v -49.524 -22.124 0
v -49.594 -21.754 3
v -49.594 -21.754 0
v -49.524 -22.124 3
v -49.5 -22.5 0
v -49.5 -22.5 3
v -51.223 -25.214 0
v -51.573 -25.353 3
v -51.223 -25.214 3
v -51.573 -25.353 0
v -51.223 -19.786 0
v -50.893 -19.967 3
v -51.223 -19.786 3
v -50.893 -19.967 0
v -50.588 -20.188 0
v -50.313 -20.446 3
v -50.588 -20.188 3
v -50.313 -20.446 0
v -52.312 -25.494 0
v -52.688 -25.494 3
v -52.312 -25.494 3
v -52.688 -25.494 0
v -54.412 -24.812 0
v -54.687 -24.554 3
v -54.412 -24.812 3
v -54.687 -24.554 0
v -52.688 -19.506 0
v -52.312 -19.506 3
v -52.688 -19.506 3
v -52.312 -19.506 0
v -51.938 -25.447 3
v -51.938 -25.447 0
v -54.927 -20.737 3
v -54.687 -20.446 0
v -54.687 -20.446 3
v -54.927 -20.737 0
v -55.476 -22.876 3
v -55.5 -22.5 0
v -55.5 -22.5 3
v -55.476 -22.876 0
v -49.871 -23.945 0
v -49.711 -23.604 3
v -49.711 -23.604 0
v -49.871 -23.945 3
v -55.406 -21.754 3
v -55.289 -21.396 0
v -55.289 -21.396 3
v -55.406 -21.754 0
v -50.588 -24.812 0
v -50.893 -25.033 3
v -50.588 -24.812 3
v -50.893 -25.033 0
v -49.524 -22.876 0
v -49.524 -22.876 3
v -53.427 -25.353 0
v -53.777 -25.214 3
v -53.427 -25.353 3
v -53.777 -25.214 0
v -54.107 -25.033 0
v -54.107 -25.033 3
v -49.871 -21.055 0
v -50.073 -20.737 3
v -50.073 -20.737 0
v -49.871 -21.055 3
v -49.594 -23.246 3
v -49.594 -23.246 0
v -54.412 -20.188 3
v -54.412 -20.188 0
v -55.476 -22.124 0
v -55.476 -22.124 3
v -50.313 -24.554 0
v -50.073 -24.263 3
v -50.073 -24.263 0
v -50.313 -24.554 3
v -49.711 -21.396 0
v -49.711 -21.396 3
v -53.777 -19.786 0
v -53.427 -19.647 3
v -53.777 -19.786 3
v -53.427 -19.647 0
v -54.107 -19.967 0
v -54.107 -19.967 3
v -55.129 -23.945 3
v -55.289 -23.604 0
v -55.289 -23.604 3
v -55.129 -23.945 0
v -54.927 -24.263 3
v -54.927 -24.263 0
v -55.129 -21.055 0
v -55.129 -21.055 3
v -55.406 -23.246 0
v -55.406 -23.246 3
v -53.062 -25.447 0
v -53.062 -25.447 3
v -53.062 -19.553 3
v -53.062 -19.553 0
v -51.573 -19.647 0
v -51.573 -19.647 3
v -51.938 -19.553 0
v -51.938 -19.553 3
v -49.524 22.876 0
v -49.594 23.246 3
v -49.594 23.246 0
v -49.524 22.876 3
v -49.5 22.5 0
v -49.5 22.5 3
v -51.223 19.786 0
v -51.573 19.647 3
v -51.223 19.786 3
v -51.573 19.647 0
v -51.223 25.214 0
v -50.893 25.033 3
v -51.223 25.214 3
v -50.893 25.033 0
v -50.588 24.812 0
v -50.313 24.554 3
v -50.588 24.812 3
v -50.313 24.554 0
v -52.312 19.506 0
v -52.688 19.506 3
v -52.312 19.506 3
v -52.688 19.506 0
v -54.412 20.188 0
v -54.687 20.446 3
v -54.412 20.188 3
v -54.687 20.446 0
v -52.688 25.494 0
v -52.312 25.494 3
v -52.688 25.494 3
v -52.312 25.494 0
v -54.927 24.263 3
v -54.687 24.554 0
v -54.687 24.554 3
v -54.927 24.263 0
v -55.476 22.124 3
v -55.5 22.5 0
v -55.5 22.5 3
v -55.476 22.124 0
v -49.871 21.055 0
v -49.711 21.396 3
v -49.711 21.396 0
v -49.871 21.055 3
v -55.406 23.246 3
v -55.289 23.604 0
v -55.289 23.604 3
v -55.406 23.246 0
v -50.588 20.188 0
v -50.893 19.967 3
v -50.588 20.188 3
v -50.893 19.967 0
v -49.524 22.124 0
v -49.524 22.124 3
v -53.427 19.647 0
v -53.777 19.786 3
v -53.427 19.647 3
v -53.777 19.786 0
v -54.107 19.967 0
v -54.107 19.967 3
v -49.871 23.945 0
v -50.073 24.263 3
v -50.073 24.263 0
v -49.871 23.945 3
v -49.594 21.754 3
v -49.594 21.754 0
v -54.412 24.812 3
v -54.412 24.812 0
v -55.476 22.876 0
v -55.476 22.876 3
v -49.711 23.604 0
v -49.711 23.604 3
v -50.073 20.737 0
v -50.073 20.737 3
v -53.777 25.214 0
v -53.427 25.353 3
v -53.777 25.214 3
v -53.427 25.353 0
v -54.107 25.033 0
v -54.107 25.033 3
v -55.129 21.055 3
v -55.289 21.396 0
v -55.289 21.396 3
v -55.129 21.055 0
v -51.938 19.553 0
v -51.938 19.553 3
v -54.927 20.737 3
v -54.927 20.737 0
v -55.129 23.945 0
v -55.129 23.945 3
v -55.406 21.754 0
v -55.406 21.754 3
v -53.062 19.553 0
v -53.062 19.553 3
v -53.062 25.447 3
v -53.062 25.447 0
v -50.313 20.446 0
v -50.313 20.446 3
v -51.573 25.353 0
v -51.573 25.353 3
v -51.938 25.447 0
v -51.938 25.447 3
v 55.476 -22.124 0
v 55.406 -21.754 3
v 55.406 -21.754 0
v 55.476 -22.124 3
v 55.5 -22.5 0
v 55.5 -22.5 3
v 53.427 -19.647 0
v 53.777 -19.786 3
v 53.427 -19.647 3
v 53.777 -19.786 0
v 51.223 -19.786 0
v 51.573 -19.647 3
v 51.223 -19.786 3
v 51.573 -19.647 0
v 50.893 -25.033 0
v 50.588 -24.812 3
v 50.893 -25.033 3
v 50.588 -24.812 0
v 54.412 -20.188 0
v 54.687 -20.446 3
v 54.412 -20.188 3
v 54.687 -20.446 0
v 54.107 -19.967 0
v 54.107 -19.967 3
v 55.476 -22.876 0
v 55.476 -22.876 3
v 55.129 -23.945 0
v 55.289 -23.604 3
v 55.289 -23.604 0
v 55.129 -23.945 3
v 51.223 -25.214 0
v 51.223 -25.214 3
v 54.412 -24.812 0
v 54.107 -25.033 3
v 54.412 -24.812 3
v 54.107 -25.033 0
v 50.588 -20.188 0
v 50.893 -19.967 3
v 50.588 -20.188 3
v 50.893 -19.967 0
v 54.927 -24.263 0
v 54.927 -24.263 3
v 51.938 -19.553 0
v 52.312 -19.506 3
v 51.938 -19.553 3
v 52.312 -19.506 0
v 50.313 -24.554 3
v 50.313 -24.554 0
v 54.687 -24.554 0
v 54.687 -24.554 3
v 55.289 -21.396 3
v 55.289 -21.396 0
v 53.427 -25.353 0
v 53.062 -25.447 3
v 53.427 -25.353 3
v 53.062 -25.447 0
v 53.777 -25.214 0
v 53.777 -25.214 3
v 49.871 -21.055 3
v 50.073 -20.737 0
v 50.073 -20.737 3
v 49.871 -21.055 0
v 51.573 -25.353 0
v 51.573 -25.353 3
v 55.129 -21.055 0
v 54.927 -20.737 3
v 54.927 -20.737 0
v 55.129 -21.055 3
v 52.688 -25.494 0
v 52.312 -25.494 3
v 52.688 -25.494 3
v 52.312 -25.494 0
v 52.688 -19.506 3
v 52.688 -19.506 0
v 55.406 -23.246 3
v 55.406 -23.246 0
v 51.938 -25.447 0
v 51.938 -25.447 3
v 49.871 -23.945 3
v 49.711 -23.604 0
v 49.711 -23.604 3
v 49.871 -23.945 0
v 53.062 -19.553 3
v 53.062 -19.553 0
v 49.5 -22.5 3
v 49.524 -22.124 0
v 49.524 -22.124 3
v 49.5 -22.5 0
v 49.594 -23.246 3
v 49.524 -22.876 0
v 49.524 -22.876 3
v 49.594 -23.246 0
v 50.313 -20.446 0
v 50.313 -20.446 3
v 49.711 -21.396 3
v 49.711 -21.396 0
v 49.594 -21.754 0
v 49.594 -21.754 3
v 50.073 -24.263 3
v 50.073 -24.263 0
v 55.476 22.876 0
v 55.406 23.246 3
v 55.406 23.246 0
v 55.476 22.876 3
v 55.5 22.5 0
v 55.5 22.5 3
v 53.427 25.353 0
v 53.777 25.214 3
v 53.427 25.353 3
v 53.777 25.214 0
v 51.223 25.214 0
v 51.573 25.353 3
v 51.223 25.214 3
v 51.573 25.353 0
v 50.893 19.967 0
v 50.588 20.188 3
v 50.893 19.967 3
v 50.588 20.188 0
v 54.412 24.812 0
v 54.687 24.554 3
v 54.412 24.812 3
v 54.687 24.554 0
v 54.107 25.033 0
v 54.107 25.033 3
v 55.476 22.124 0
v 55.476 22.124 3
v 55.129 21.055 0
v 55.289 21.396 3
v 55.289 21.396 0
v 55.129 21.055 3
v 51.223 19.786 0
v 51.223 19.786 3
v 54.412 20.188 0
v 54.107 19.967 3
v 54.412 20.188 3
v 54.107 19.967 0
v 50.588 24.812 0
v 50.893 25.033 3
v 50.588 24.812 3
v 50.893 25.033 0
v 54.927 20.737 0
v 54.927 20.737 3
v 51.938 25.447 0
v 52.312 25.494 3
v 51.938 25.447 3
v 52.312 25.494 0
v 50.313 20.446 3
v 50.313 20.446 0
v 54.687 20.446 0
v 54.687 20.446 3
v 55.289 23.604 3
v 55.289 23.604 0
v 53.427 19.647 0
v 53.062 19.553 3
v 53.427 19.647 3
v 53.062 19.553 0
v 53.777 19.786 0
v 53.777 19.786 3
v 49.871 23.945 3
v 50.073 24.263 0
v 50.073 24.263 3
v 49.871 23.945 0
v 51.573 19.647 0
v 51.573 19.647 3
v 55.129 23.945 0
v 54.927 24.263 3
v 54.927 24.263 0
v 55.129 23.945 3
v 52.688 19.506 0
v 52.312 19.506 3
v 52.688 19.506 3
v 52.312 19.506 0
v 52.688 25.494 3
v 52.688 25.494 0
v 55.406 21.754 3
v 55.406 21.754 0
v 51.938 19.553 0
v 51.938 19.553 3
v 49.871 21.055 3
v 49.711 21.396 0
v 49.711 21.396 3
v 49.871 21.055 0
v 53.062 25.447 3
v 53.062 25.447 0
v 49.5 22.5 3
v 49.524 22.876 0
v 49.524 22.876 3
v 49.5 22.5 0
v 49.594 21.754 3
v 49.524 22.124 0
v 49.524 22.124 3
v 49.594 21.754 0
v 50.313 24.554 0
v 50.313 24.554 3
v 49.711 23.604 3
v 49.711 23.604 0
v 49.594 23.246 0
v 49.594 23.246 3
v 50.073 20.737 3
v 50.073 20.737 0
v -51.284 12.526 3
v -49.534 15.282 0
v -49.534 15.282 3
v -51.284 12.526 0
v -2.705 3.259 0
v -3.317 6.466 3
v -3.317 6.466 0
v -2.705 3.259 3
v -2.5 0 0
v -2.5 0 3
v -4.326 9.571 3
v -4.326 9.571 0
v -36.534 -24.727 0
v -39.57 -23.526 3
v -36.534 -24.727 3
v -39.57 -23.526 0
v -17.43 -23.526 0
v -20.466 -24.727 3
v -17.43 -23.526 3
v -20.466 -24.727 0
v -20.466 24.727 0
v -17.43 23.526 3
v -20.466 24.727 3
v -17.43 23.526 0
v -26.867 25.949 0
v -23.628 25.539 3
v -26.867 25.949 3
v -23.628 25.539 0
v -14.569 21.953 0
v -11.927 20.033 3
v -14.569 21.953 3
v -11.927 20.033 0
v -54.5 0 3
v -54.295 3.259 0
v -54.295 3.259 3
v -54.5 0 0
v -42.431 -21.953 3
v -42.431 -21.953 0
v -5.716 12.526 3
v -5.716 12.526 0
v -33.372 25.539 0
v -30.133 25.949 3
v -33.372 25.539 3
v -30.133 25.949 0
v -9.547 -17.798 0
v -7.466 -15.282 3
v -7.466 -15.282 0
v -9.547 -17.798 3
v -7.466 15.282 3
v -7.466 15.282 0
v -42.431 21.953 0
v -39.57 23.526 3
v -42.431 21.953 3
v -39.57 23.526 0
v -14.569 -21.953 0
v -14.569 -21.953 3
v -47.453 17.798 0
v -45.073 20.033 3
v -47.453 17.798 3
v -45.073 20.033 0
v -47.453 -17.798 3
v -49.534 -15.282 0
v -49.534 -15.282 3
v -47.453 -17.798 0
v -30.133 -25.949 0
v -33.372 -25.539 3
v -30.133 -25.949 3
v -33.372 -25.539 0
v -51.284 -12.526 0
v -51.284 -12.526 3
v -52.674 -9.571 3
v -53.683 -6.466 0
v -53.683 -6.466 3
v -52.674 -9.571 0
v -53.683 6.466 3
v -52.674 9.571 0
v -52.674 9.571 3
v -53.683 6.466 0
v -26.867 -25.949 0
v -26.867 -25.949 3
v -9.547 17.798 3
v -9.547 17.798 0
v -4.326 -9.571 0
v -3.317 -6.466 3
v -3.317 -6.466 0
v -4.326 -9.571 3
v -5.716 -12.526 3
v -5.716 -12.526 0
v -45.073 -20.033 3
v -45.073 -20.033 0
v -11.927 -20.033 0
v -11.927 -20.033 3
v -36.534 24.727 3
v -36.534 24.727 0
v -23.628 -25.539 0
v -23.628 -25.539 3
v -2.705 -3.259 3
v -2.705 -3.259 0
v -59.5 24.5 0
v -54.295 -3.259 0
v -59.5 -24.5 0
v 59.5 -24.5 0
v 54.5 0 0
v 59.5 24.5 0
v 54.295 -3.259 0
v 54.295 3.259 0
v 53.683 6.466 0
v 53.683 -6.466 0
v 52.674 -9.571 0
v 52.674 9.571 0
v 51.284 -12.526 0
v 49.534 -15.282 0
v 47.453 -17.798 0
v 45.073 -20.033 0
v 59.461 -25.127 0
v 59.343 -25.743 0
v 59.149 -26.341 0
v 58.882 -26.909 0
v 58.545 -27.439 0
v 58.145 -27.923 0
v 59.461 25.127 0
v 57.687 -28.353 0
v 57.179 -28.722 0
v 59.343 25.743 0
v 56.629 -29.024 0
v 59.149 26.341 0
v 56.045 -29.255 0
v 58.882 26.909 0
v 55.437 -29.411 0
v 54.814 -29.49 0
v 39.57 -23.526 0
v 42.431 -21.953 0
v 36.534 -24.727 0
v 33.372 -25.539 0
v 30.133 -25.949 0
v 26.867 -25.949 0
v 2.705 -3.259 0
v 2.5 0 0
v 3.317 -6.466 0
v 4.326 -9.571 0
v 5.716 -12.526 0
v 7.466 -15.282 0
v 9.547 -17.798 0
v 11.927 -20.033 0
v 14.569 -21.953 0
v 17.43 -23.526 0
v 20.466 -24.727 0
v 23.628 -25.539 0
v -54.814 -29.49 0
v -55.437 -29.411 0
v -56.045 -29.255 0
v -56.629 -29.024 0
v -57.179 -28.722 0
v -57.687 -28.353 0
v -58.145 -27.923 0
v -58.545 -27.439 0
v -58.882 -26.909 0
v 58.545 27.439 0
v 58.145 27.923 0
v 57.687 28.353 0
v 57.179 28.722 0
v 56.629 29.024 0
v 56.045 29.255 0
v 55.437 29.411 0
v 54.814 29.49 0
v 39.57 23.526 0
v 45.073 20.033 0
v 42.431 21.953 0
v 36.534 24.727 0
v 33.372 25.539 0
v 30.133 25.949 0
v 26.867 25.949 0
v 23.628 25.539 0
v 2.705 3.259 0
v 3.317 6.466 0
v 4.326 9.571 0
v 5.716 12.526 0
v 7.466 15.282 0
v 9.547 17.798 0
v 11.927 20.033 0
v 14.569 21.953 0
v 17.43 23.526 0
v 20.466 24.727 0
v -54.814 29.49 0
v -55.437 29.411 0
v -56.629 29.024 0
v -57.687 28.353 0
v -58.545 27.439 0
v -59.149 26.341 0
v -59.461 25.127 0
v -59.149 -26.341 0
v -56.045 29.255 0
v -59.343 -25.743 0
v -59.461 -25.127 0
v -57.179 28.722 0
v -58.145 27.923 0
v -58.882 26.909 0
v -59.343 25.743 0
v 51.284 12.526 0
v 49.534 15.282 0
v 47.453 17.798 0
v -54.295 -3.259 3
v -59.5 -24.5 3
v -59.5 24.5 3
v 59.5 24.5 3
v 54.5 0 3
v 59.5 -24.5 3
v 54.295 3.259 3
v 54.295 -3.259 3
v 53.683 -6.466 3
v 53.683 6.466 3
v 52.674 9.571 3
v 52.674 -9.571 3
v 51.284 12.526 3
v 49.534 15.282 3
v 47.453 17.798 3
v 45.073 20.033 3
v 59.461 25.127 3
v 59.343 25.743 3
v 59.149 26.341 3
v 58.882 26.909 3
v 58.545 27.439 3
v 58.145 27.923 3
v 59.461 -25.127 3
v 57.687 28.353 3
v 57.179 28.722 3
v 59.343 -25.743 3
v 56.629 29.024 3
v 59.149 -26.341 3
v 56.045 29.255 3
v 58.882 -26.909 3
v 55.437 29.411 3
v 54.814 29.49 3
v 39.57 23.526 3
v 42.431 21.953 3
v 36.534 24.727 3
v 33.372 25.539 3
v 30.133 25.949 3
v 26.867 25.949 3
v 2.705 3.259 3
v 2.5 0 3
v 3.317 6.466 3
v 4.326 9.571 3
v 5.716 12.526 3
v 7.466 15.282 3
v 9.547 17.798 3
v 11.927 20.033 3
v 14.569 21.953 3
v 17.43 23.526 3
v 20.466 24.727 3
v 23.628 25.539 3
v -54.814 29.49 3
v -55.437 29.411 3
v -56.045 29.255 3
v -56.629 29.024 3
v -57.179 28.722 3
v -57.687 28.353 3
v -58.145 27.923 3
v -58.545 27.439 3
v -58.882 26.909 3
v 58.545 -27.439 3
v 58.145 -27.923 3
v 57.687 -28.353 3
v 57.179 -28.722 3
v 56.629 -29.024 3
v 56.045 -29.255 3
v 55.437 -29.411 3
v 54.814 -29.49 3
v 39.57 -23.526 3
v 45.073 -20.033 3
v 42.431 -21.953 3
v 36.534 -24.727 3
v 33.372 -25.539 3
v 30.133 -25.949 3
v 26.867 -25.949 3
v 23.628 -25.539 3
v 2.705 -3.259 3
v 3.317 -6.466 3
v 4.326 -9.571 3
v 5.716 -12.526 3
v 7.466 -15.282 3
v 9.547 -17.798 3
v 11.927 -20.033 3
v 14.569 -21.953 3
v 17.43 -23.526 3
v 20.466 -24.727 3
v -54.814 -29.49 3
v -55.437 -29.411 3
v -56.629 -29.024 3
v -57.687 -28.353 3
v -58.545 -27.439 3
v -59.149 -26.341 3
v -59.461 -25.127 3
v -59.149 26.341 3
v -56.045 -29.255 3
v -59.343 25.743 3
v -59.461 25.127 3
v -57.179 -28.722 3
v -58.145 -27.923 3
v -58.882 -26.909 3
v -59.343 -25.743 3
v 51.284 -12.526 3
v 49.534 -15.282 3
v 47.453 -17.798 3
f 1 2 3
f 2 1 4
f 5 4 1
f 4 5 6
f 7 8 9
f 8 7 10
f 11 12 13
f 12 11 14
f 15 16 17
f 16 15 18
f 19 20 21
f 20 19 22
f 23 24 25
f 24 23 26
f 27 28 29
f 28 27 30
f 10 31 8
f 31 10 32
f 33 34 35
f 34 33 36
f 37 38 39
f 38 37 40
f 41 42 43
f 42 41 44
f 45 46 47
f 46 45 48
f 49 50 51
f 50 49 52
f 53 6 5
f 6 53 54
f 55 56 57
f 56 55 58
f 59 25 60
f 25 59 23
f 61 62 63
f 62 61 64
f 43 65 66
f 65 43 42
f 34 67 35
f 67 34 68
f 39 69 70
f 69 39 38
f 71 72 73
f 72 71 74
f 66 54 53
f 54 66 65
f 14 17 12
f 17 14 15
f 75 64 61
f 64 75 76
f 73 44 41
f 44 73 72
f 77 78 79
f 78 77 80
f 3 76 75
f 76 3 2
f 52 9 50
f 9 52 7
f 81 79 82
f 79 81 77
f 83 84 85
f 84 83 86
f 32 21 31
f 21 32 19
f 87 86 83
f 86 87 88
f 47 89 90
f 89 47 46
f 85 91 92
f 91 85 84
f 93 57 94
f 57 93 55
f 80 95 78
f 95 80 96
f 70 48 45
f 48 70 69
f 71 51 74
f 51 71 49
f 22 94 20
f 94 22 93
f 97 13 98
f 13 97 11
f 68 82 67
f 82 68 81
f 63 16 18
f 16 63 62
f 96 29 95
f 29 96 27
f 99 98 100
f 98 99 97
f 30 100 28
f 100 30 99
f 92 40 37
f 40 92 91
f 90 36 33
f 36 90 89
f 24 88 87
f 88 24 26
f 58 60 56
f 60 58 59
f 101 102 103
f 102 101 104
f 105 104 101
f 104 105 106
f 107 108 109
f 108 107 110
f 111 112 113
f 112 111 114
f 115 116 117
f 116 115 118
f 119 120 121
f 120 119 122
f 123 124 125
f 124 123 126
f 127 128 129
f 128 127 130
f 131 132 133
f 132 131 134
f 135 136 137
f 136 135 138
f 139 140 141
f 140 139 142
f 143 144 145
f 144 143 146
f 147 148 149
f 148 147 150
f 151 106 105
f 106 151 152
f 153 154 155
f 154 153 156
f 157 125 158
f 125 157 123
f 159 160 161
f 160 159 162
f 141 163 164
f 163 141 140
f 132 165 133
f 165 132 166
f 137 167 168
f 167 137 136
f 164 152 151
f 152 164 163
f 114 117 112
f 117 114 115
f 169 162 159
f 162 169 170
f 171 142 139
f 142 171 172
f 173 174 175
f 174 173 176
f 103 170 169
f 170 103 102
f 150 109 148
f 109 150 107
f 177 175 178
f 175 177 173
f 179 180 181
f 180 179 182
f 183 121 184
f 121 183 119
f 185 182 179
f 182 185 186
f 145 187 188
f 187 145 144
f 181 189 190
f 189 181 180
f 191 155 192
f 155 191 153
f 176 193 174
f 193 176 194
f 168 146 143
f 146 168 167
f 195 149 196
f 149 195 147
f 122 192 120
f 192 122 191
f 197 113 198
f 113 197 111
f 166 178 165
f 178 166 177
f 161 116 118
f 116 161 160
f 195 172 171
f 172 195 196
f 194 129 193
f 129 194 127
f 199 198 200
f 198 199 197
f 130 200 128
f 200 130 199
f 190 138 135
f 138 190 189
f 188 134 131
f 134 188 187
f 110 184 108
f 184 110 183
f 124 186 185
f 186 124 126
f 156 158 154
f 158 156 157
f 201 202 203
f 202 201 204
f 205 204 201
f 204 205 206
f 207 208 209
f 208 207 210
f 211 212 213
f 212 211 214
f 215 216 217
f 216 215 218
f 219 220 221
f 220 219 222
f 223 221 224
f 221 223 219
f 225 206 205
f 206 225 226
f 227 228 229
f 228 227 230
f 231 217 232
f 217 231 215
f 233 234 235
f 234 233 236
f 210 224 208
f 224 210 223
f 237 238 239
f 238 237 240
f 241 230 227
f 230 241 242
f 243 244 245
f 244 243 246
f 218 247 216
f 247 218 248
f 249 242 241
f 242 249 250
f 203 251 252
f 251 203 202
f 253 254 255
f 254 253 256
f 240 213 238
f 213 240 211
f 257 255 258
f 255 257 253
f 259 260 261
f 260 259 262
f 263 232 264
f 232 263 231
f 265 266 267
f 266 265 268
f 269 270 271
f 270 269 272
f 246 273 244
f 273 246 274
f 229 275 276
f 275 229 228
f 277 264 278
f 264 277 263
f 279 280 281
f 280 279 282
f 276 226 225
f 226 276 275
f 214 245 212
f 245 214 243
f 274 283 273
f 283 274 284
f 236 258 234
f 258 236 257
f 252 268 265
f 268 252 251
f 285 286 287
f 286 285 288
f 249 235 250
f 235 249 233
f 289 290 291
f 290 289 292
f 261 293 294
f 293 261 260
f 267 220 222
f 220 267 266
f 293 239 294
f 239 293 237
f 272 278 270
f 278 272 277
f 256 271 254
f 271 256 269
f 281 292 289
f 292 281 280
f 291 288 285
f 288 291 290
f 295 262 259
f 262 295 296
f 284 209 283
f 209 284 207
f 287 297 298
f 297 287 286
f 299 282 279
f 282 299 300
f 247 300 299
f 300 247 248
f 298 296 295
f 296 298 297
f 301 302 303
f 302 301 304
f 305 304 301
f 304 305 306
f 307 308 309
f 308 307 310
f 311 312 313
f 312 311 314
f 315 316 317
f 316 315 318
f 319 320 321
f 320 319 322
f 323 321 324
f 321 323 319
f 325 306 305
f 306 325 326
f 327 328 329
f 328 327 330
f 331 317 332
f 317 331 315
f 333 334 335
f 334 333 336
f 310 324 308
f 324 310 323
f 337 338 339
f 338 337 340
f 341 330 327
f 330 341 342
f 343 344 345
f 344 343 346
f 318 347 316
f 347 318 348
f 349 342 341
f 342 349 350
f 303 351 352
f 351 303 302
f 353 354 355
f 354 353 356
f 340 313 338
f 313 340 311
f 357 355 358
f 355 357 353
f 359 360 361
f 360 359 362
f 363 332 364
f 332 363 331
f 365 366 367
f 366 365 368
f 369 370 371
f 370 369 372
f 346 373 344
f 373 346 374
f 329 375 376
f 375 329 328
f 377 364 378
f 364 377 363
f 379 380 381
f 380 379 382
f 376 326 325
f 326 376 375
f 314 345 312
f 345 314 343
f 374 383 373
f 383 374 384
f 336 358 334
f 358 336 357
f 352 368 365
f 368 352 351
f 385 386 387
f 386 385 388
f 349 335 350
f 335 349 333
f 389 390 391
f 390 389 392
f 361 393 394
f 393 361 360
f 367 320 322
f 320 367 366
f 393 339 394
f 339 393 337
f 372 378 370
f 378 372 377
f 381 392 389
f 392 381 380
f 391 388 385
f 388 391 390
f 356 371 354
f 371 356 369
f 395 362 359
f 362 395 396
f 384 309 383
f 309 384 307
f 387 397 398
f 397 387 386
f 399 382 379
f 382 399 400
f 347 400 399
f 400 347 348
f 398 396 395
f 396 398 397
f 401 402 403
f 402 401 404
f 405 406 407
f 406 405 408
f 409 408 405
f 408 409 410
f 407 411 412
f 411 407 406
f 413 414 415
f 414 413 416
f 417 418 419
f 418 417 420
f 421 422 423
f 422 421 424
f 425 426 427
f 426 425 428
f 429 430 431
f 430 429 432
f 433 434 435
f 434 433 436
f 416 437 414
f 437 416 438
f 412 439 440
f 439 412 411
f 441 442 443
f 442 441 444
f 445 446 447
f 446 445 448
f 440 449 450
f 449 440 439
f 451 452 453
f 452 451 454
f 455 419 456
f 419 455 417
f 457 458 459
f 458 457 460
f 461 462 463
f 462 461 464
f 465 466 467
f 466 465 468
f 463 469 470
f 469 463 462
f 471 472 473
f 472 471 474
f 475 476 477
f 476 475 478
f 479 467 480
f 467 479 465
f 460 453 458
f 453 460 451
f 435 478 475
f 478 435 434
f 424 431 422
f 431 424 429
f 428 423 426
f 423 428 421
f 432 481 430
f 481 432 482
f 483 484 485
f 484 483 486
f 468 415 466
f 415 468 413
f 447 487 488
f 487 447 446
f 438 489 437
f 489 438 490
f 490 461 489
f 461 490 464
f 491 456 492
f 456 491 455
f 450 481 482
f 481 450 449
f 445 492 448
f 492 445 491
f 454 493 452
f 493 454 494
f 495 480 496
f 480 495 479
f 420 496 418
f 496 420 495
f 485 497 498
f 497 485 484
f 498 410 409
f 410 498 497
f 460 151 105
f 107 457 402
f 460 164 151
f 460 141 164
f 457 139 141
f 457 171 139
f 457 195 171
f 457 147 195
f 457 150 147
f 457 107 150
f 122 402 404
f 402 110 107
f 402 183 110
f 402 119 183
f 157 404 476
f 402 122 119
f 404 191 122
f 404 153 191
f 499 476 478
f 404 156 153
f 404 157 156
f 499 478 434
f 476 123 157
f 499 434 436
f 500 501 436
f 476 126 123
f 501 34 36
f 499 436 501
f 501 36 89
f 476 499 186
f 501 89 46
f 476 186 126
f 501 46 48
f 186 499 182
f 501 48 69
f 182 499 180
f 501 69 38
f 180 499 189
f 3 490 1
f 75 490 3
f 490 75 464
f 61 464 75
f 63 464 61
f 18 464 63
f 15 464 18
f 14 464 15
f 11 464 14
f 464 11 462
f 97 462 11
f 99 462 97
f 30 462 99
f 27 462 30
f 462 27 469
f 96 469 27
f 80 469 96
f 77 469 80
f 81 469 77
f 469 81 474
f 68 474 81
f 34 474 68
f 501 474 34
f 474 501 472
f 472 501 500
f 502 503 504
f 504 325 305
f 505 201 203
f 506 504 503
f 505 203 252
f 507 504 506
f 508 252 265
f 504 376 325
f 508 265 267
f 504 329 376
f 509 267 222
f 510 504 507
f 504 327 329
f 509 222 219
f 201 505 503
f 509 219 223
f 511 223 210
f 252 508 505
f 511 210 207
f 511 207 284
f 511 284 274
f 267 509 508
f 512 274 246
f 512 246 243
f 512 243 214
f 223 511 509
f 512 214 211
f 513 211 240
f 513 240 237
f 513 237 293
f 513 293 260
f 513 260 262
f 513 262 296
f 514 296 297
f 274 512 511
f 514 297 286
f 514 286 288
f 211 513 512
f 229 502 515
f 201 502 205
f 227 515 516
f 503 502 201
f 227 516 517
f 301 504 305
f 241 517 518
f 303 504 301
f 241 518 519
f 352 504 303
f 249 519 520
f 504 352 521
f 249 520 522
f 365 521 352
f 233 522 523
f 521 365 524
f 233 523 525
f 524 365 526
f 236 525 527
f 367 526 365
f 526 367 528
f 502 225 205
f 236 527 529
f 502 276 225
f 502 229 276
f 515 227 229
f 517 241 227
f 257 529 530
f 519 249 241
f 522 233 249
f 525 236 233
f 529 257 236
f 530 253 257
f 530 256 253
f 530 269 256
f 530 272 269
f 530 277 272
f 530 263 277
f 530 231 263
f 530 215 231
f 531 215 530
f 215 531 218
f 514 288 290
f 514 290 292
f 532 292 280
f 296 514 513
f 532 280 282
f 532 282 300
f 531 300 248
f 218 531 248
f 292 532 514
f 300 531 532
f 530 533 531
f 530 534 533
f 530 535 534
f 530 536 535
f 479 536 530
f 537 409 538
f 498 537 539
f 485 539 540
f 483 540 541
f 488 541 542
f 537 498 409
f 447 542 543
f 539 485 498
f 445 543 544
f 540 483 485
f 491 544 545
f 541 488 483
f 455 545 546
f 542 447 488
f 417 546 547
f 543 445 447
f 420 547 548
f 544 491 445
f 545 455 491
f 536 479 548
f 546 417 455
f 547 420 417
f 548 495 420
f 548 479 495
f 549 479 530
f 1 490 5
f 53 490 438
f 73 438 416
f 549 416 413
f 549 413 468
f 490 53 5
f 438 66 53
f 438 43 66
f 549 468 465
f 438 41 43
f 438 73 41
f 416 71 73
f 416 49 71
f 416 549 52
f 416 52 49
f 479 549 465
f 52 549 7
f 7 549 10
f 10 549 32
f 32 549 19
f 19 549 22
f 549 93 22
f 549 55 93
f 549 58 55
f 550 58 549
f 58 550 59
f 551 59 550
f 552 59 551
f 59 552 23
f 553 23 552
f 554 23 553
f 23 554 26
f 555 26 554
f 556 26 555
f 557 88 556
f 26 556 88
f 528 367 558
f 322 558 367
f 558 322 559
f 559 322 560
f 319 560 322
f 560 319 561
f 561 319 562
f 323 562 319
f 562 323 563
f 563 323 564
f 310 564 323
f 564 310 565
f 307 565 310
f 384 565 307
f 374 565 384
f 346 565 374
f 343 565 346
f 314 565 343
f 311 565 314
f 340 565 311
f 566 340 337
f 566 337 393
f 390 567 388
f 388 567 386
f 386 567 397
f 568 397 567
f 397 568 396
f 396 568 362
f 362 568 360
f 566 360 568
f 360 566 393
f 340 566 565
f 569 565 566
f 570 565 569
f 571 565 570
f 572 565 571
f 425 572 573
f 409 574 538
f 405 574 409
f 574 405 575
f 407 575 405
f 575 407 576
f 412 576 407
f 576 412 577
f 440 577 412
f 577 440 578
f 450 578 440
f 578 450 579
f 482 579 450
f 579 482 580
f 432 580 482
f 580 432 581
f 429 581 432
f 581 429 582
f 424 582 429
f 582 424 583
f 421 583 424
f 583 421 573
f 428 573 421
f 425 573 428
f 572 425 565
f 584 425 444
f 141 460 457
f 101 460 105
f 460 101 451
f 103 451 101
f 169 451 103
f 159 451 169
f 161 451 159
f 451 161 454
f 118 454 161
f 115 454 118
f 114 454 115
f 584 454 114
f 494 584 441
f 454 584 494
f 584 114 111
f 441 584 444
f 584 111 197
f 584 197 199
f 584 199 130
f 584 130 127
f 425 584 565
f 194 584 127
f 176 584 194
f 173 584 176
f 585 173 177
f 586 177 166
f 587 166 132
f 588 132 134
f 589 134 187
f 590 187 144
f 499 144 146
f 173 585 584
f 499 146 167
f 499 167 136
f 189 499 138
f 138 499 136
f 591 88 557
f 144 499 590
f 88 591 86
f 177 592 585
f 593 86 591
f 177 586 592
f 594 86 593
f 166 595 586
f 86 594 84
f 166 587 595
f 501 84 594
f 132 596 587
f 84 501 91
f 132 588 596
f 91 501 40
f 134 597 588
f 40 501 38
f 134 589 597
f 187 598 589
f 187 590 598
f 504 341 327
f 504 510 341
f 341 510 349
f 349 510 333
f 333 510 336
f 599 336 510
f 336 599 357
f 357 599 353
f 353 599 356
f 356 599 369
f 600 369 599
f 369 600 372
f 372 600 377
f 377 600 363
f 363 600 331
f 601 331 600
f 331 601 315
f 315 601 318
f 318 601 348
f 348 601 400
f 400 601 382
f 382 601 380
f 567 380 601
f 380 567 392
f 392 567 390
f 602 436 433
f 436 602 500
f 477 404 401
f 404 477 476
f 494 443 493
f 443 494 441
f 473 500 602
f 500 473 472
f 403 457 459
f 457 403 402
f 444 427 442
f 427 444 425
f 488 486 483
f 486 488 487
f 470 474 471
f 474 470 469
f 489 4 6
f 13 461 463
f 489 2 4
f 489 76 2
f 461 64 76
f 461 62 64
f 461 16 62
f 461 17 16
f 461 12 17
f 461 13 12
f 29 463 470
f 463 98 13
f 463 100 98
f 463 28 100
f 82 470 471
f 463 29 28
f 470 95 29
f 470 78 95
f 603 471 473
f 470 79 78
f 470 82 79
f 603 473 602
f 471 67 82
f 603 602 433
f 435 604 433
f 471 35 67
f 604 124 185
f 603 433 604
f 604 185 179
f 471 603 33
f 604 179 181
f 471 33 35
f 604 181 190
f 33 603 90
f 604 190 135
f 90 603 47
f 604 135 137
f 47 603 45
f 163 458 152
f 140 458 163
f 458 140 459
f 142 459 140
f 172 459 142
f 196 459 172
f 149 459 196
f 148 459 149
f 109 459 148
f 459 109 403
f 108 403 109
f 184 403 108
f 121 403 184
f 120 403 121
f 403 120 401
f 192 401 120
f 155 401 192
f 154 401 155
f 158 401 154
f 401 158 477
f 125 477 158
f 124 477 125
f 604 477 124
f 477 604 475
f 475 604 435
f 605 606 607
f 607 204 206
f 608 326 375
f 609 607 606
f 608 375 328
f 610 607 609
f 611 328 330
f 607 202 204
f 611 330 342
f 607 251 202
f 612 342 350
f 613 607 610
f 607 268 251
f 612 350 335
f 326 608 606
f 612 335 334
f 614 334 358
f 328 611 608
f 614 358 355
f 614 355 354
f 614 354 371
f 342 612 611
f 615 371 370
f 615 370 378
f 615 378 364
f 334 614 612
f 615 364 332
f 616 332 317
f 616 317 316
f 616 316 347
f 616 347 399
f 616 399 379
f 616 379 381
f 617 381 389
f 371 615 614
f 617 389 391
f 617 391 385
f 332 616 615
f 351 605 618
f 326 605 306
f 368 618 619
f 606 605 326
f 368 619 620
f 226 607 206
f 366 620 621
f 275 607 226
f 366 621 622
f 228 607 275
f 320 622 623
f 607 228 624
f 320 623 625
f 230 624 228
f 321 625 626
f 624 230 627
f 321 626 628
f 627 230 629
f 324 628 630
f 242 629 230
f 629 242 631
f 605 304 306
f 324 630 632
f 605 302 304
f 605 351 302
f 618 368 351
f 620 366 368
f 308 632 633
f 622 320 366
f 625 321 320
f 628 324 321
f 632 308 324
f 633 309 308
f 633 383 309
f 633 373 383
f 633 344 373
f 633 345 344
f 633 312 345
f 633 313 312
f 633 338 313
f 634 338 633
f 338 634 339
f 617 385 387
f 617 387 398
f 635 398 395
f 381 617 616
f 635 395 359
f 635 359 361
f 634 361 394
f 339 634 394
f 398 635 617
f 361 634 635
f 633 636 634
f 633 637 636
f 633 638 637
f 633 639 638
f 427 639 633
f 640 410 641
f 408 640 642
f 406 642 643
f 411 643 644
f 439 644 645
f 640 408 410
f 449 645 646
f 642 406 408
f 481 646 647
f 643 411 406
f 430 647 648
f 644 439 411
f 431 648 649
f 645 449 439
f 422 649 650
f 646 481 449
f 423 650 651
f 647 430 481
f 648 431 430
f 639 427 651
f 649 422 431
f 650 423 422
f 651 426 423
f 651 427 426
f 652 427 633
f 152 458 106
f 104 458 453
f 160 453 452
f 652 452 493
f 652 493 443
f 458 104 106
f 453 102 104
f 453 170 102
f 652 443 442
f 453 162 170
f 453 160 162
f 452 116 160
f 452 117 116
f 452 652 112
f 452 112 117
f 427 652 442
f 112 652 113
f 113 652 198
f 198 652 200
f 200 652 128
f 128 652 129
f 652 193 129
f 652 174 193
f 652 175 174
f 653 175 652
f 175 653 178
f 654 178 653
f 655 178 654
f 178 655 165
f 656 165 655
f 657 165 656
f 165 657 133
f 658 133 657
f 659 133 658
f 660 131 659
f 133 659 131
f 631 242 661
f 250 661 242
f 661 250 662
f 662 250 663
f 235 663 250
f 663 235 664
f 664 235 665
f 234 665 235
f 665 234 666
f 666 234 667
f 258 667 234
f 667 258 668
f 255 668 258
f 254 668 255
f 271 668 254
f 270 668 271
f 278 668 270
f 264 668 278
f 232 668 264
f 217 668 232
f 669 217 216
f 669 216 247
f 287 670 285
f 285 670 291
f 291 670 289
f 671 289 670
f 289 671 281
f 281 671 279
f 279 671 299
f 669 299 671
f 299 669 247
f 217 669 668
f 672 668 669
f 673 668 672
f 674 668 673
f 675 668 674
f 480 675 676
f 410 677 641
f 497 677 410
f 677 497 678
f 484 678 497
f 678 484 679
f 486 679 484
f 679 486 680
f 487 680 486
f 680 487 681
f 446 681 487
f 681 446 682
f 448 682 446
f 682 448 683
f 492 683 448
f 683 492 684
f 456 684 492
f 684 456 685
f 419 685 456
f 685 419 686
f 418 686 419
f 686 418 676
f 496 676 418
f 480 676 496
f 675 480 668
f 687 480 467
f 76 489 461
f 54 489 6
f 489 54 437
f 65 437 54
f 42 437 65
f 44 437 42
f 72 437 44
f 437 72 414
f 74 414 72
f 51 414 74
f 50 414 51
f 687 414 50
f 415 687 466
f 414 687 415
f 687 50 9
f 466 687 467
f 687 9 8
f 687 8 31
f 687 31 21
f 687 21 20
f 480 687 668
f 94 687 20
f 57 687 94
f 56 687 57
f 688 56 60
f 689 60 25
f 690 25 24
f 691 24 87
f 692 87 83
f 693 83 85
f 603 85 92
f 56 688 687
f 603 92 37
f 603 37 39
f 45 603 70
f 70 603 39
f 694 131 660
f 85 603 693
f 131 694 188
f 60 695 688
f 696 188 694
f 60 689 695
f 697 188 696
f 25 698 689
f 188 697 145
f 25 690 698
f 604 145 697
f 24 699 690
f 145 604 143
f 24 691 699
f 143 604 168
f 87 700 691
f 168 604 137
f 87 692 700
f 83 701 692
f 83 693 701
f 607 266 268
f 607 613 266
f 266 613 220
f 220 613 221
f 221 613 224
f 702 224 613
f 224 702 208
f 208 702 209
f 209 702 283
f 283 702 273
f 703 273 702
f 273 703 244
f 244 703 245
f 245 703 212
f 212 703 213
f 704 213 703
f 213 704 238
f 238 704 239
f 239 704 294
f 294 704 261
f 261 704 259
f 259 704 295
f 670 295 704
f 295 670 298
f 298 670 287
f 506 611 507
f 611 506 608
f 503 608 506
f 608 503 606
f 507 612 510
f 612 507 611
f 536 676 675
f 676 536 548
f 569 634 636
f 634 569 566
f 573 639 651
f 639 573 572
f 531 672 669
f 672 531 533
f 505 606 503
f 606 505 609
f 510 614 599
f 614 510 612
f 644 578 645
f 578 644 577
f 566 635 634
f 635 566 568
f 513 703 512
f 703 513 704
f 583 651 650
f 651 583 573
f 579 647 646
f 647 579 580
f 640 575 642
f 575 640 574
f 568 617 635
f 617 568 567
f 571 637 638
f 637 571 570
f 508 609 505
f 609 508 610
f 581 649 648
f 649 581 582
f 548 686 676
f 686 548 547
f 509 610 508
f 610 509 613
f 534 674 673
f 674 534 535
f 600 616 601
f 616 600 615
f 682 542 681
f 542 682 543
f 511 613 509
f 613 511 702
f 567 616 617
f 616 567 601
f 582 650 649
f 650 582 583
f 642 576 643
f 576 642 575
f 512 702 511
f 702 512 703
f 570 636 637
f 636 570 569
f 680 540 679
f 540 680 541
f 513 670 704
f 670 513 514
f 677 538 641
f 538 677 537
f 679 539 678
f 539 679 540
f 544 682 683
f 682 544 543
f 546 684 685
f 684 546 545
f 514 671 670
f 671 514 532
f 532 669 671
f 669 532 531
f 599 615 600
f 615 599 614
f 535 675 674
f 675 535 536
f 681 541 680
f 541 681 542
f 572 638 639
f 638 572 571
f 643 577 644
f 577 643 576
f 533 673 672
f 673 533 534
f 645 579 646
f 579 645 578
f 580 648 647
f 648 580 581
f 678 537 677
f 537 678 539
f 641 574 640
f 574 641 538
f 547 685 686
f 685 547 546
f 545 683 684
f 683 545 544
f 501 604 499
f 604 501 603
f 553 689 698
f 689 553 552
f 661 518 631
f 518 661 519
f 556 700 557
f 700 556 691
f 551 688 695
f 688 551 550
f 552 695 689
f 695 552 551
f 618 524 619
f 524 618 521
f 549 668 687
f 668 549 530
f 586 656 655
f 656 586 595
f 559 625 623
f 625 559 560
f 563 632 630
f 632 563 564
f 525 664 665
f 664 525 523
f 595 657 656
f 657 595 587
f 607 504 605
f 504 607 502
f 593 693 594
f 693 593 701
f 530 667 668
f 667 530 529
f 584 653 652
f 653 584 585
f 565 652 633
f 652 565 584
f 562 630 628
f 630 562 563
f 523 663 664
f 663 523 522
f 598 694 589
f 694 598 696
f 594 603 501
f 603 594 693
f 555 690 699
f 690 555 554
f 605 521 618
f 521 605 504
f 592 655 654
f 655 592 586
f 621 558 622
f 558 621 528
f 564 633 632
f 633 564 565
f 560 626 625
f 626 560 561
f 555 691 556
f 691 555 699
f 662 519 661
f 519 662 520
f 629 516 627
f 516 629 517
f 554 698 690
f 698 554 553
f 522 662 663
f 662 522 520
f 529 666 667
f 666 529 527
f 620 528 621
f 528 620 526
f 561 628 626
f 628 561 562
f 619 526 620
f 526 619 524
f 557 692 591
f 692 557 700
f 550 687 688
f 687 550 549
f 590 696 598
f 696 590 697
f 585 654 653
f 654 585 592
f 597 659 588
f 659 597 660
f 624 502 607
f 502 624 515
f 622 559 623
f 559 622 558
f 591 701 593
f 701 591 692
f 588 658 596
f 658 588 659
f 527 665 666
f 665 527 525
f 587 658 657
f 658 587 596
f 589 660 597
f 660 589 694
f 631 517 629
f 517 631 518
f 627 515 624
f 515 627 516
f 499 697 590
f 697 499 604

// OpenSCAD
$fn = 50;


difference() {
	union() {
		hull() {
			translate(v = [-54.5000000000, 24.5000000000, 0]) {
				cylinder(h = 3, r = 5);
			}
			translate(v = [54.5000000000, 24.5000000000, 0]) {
				cylinder(h = 3, r = 5);
			}
			translate(v = [-54.5000000000, -24.5000000000, 0]) {
				cylinder(h = 3, r = 5);
			}
			translate(v = [54.5000000000, -24.5000000000, 0]) {
				cylinder(h = 3, r = 5);
			}
		}
	}
	union() {
		#translate(v = [-52.5000000000, -22.5000000000, -100.0000000000]) {
			cylinder(h = 200, r = 3.0000000000);
		}
		#translate(v = [-52.5000000000, 22.5000000000, -100.0000000000]) {
			cylinder(h = 200, r = 3.0000000000);
		}
		#translate(v = [52.5000000000, -22.5000000000, -100.0000000000]) {
			cylinder(h = 200, r = 3.0000000000);
		}
		#translate(v = [52.5000000000, 22.5000000000, -100.0000000000]) {
			cylinder(h = 200, r = 3.0000000000);
		}
		#translate(v = [-28.5000000000, 0, 0]) {
			cylinder(h = 3, r = 26.0000000000);
		}
		#translate(v = [28.5000000000, 0, 0]) {
			cylinder(h = 3, r = 26.0000000000);
		}
	}
}
